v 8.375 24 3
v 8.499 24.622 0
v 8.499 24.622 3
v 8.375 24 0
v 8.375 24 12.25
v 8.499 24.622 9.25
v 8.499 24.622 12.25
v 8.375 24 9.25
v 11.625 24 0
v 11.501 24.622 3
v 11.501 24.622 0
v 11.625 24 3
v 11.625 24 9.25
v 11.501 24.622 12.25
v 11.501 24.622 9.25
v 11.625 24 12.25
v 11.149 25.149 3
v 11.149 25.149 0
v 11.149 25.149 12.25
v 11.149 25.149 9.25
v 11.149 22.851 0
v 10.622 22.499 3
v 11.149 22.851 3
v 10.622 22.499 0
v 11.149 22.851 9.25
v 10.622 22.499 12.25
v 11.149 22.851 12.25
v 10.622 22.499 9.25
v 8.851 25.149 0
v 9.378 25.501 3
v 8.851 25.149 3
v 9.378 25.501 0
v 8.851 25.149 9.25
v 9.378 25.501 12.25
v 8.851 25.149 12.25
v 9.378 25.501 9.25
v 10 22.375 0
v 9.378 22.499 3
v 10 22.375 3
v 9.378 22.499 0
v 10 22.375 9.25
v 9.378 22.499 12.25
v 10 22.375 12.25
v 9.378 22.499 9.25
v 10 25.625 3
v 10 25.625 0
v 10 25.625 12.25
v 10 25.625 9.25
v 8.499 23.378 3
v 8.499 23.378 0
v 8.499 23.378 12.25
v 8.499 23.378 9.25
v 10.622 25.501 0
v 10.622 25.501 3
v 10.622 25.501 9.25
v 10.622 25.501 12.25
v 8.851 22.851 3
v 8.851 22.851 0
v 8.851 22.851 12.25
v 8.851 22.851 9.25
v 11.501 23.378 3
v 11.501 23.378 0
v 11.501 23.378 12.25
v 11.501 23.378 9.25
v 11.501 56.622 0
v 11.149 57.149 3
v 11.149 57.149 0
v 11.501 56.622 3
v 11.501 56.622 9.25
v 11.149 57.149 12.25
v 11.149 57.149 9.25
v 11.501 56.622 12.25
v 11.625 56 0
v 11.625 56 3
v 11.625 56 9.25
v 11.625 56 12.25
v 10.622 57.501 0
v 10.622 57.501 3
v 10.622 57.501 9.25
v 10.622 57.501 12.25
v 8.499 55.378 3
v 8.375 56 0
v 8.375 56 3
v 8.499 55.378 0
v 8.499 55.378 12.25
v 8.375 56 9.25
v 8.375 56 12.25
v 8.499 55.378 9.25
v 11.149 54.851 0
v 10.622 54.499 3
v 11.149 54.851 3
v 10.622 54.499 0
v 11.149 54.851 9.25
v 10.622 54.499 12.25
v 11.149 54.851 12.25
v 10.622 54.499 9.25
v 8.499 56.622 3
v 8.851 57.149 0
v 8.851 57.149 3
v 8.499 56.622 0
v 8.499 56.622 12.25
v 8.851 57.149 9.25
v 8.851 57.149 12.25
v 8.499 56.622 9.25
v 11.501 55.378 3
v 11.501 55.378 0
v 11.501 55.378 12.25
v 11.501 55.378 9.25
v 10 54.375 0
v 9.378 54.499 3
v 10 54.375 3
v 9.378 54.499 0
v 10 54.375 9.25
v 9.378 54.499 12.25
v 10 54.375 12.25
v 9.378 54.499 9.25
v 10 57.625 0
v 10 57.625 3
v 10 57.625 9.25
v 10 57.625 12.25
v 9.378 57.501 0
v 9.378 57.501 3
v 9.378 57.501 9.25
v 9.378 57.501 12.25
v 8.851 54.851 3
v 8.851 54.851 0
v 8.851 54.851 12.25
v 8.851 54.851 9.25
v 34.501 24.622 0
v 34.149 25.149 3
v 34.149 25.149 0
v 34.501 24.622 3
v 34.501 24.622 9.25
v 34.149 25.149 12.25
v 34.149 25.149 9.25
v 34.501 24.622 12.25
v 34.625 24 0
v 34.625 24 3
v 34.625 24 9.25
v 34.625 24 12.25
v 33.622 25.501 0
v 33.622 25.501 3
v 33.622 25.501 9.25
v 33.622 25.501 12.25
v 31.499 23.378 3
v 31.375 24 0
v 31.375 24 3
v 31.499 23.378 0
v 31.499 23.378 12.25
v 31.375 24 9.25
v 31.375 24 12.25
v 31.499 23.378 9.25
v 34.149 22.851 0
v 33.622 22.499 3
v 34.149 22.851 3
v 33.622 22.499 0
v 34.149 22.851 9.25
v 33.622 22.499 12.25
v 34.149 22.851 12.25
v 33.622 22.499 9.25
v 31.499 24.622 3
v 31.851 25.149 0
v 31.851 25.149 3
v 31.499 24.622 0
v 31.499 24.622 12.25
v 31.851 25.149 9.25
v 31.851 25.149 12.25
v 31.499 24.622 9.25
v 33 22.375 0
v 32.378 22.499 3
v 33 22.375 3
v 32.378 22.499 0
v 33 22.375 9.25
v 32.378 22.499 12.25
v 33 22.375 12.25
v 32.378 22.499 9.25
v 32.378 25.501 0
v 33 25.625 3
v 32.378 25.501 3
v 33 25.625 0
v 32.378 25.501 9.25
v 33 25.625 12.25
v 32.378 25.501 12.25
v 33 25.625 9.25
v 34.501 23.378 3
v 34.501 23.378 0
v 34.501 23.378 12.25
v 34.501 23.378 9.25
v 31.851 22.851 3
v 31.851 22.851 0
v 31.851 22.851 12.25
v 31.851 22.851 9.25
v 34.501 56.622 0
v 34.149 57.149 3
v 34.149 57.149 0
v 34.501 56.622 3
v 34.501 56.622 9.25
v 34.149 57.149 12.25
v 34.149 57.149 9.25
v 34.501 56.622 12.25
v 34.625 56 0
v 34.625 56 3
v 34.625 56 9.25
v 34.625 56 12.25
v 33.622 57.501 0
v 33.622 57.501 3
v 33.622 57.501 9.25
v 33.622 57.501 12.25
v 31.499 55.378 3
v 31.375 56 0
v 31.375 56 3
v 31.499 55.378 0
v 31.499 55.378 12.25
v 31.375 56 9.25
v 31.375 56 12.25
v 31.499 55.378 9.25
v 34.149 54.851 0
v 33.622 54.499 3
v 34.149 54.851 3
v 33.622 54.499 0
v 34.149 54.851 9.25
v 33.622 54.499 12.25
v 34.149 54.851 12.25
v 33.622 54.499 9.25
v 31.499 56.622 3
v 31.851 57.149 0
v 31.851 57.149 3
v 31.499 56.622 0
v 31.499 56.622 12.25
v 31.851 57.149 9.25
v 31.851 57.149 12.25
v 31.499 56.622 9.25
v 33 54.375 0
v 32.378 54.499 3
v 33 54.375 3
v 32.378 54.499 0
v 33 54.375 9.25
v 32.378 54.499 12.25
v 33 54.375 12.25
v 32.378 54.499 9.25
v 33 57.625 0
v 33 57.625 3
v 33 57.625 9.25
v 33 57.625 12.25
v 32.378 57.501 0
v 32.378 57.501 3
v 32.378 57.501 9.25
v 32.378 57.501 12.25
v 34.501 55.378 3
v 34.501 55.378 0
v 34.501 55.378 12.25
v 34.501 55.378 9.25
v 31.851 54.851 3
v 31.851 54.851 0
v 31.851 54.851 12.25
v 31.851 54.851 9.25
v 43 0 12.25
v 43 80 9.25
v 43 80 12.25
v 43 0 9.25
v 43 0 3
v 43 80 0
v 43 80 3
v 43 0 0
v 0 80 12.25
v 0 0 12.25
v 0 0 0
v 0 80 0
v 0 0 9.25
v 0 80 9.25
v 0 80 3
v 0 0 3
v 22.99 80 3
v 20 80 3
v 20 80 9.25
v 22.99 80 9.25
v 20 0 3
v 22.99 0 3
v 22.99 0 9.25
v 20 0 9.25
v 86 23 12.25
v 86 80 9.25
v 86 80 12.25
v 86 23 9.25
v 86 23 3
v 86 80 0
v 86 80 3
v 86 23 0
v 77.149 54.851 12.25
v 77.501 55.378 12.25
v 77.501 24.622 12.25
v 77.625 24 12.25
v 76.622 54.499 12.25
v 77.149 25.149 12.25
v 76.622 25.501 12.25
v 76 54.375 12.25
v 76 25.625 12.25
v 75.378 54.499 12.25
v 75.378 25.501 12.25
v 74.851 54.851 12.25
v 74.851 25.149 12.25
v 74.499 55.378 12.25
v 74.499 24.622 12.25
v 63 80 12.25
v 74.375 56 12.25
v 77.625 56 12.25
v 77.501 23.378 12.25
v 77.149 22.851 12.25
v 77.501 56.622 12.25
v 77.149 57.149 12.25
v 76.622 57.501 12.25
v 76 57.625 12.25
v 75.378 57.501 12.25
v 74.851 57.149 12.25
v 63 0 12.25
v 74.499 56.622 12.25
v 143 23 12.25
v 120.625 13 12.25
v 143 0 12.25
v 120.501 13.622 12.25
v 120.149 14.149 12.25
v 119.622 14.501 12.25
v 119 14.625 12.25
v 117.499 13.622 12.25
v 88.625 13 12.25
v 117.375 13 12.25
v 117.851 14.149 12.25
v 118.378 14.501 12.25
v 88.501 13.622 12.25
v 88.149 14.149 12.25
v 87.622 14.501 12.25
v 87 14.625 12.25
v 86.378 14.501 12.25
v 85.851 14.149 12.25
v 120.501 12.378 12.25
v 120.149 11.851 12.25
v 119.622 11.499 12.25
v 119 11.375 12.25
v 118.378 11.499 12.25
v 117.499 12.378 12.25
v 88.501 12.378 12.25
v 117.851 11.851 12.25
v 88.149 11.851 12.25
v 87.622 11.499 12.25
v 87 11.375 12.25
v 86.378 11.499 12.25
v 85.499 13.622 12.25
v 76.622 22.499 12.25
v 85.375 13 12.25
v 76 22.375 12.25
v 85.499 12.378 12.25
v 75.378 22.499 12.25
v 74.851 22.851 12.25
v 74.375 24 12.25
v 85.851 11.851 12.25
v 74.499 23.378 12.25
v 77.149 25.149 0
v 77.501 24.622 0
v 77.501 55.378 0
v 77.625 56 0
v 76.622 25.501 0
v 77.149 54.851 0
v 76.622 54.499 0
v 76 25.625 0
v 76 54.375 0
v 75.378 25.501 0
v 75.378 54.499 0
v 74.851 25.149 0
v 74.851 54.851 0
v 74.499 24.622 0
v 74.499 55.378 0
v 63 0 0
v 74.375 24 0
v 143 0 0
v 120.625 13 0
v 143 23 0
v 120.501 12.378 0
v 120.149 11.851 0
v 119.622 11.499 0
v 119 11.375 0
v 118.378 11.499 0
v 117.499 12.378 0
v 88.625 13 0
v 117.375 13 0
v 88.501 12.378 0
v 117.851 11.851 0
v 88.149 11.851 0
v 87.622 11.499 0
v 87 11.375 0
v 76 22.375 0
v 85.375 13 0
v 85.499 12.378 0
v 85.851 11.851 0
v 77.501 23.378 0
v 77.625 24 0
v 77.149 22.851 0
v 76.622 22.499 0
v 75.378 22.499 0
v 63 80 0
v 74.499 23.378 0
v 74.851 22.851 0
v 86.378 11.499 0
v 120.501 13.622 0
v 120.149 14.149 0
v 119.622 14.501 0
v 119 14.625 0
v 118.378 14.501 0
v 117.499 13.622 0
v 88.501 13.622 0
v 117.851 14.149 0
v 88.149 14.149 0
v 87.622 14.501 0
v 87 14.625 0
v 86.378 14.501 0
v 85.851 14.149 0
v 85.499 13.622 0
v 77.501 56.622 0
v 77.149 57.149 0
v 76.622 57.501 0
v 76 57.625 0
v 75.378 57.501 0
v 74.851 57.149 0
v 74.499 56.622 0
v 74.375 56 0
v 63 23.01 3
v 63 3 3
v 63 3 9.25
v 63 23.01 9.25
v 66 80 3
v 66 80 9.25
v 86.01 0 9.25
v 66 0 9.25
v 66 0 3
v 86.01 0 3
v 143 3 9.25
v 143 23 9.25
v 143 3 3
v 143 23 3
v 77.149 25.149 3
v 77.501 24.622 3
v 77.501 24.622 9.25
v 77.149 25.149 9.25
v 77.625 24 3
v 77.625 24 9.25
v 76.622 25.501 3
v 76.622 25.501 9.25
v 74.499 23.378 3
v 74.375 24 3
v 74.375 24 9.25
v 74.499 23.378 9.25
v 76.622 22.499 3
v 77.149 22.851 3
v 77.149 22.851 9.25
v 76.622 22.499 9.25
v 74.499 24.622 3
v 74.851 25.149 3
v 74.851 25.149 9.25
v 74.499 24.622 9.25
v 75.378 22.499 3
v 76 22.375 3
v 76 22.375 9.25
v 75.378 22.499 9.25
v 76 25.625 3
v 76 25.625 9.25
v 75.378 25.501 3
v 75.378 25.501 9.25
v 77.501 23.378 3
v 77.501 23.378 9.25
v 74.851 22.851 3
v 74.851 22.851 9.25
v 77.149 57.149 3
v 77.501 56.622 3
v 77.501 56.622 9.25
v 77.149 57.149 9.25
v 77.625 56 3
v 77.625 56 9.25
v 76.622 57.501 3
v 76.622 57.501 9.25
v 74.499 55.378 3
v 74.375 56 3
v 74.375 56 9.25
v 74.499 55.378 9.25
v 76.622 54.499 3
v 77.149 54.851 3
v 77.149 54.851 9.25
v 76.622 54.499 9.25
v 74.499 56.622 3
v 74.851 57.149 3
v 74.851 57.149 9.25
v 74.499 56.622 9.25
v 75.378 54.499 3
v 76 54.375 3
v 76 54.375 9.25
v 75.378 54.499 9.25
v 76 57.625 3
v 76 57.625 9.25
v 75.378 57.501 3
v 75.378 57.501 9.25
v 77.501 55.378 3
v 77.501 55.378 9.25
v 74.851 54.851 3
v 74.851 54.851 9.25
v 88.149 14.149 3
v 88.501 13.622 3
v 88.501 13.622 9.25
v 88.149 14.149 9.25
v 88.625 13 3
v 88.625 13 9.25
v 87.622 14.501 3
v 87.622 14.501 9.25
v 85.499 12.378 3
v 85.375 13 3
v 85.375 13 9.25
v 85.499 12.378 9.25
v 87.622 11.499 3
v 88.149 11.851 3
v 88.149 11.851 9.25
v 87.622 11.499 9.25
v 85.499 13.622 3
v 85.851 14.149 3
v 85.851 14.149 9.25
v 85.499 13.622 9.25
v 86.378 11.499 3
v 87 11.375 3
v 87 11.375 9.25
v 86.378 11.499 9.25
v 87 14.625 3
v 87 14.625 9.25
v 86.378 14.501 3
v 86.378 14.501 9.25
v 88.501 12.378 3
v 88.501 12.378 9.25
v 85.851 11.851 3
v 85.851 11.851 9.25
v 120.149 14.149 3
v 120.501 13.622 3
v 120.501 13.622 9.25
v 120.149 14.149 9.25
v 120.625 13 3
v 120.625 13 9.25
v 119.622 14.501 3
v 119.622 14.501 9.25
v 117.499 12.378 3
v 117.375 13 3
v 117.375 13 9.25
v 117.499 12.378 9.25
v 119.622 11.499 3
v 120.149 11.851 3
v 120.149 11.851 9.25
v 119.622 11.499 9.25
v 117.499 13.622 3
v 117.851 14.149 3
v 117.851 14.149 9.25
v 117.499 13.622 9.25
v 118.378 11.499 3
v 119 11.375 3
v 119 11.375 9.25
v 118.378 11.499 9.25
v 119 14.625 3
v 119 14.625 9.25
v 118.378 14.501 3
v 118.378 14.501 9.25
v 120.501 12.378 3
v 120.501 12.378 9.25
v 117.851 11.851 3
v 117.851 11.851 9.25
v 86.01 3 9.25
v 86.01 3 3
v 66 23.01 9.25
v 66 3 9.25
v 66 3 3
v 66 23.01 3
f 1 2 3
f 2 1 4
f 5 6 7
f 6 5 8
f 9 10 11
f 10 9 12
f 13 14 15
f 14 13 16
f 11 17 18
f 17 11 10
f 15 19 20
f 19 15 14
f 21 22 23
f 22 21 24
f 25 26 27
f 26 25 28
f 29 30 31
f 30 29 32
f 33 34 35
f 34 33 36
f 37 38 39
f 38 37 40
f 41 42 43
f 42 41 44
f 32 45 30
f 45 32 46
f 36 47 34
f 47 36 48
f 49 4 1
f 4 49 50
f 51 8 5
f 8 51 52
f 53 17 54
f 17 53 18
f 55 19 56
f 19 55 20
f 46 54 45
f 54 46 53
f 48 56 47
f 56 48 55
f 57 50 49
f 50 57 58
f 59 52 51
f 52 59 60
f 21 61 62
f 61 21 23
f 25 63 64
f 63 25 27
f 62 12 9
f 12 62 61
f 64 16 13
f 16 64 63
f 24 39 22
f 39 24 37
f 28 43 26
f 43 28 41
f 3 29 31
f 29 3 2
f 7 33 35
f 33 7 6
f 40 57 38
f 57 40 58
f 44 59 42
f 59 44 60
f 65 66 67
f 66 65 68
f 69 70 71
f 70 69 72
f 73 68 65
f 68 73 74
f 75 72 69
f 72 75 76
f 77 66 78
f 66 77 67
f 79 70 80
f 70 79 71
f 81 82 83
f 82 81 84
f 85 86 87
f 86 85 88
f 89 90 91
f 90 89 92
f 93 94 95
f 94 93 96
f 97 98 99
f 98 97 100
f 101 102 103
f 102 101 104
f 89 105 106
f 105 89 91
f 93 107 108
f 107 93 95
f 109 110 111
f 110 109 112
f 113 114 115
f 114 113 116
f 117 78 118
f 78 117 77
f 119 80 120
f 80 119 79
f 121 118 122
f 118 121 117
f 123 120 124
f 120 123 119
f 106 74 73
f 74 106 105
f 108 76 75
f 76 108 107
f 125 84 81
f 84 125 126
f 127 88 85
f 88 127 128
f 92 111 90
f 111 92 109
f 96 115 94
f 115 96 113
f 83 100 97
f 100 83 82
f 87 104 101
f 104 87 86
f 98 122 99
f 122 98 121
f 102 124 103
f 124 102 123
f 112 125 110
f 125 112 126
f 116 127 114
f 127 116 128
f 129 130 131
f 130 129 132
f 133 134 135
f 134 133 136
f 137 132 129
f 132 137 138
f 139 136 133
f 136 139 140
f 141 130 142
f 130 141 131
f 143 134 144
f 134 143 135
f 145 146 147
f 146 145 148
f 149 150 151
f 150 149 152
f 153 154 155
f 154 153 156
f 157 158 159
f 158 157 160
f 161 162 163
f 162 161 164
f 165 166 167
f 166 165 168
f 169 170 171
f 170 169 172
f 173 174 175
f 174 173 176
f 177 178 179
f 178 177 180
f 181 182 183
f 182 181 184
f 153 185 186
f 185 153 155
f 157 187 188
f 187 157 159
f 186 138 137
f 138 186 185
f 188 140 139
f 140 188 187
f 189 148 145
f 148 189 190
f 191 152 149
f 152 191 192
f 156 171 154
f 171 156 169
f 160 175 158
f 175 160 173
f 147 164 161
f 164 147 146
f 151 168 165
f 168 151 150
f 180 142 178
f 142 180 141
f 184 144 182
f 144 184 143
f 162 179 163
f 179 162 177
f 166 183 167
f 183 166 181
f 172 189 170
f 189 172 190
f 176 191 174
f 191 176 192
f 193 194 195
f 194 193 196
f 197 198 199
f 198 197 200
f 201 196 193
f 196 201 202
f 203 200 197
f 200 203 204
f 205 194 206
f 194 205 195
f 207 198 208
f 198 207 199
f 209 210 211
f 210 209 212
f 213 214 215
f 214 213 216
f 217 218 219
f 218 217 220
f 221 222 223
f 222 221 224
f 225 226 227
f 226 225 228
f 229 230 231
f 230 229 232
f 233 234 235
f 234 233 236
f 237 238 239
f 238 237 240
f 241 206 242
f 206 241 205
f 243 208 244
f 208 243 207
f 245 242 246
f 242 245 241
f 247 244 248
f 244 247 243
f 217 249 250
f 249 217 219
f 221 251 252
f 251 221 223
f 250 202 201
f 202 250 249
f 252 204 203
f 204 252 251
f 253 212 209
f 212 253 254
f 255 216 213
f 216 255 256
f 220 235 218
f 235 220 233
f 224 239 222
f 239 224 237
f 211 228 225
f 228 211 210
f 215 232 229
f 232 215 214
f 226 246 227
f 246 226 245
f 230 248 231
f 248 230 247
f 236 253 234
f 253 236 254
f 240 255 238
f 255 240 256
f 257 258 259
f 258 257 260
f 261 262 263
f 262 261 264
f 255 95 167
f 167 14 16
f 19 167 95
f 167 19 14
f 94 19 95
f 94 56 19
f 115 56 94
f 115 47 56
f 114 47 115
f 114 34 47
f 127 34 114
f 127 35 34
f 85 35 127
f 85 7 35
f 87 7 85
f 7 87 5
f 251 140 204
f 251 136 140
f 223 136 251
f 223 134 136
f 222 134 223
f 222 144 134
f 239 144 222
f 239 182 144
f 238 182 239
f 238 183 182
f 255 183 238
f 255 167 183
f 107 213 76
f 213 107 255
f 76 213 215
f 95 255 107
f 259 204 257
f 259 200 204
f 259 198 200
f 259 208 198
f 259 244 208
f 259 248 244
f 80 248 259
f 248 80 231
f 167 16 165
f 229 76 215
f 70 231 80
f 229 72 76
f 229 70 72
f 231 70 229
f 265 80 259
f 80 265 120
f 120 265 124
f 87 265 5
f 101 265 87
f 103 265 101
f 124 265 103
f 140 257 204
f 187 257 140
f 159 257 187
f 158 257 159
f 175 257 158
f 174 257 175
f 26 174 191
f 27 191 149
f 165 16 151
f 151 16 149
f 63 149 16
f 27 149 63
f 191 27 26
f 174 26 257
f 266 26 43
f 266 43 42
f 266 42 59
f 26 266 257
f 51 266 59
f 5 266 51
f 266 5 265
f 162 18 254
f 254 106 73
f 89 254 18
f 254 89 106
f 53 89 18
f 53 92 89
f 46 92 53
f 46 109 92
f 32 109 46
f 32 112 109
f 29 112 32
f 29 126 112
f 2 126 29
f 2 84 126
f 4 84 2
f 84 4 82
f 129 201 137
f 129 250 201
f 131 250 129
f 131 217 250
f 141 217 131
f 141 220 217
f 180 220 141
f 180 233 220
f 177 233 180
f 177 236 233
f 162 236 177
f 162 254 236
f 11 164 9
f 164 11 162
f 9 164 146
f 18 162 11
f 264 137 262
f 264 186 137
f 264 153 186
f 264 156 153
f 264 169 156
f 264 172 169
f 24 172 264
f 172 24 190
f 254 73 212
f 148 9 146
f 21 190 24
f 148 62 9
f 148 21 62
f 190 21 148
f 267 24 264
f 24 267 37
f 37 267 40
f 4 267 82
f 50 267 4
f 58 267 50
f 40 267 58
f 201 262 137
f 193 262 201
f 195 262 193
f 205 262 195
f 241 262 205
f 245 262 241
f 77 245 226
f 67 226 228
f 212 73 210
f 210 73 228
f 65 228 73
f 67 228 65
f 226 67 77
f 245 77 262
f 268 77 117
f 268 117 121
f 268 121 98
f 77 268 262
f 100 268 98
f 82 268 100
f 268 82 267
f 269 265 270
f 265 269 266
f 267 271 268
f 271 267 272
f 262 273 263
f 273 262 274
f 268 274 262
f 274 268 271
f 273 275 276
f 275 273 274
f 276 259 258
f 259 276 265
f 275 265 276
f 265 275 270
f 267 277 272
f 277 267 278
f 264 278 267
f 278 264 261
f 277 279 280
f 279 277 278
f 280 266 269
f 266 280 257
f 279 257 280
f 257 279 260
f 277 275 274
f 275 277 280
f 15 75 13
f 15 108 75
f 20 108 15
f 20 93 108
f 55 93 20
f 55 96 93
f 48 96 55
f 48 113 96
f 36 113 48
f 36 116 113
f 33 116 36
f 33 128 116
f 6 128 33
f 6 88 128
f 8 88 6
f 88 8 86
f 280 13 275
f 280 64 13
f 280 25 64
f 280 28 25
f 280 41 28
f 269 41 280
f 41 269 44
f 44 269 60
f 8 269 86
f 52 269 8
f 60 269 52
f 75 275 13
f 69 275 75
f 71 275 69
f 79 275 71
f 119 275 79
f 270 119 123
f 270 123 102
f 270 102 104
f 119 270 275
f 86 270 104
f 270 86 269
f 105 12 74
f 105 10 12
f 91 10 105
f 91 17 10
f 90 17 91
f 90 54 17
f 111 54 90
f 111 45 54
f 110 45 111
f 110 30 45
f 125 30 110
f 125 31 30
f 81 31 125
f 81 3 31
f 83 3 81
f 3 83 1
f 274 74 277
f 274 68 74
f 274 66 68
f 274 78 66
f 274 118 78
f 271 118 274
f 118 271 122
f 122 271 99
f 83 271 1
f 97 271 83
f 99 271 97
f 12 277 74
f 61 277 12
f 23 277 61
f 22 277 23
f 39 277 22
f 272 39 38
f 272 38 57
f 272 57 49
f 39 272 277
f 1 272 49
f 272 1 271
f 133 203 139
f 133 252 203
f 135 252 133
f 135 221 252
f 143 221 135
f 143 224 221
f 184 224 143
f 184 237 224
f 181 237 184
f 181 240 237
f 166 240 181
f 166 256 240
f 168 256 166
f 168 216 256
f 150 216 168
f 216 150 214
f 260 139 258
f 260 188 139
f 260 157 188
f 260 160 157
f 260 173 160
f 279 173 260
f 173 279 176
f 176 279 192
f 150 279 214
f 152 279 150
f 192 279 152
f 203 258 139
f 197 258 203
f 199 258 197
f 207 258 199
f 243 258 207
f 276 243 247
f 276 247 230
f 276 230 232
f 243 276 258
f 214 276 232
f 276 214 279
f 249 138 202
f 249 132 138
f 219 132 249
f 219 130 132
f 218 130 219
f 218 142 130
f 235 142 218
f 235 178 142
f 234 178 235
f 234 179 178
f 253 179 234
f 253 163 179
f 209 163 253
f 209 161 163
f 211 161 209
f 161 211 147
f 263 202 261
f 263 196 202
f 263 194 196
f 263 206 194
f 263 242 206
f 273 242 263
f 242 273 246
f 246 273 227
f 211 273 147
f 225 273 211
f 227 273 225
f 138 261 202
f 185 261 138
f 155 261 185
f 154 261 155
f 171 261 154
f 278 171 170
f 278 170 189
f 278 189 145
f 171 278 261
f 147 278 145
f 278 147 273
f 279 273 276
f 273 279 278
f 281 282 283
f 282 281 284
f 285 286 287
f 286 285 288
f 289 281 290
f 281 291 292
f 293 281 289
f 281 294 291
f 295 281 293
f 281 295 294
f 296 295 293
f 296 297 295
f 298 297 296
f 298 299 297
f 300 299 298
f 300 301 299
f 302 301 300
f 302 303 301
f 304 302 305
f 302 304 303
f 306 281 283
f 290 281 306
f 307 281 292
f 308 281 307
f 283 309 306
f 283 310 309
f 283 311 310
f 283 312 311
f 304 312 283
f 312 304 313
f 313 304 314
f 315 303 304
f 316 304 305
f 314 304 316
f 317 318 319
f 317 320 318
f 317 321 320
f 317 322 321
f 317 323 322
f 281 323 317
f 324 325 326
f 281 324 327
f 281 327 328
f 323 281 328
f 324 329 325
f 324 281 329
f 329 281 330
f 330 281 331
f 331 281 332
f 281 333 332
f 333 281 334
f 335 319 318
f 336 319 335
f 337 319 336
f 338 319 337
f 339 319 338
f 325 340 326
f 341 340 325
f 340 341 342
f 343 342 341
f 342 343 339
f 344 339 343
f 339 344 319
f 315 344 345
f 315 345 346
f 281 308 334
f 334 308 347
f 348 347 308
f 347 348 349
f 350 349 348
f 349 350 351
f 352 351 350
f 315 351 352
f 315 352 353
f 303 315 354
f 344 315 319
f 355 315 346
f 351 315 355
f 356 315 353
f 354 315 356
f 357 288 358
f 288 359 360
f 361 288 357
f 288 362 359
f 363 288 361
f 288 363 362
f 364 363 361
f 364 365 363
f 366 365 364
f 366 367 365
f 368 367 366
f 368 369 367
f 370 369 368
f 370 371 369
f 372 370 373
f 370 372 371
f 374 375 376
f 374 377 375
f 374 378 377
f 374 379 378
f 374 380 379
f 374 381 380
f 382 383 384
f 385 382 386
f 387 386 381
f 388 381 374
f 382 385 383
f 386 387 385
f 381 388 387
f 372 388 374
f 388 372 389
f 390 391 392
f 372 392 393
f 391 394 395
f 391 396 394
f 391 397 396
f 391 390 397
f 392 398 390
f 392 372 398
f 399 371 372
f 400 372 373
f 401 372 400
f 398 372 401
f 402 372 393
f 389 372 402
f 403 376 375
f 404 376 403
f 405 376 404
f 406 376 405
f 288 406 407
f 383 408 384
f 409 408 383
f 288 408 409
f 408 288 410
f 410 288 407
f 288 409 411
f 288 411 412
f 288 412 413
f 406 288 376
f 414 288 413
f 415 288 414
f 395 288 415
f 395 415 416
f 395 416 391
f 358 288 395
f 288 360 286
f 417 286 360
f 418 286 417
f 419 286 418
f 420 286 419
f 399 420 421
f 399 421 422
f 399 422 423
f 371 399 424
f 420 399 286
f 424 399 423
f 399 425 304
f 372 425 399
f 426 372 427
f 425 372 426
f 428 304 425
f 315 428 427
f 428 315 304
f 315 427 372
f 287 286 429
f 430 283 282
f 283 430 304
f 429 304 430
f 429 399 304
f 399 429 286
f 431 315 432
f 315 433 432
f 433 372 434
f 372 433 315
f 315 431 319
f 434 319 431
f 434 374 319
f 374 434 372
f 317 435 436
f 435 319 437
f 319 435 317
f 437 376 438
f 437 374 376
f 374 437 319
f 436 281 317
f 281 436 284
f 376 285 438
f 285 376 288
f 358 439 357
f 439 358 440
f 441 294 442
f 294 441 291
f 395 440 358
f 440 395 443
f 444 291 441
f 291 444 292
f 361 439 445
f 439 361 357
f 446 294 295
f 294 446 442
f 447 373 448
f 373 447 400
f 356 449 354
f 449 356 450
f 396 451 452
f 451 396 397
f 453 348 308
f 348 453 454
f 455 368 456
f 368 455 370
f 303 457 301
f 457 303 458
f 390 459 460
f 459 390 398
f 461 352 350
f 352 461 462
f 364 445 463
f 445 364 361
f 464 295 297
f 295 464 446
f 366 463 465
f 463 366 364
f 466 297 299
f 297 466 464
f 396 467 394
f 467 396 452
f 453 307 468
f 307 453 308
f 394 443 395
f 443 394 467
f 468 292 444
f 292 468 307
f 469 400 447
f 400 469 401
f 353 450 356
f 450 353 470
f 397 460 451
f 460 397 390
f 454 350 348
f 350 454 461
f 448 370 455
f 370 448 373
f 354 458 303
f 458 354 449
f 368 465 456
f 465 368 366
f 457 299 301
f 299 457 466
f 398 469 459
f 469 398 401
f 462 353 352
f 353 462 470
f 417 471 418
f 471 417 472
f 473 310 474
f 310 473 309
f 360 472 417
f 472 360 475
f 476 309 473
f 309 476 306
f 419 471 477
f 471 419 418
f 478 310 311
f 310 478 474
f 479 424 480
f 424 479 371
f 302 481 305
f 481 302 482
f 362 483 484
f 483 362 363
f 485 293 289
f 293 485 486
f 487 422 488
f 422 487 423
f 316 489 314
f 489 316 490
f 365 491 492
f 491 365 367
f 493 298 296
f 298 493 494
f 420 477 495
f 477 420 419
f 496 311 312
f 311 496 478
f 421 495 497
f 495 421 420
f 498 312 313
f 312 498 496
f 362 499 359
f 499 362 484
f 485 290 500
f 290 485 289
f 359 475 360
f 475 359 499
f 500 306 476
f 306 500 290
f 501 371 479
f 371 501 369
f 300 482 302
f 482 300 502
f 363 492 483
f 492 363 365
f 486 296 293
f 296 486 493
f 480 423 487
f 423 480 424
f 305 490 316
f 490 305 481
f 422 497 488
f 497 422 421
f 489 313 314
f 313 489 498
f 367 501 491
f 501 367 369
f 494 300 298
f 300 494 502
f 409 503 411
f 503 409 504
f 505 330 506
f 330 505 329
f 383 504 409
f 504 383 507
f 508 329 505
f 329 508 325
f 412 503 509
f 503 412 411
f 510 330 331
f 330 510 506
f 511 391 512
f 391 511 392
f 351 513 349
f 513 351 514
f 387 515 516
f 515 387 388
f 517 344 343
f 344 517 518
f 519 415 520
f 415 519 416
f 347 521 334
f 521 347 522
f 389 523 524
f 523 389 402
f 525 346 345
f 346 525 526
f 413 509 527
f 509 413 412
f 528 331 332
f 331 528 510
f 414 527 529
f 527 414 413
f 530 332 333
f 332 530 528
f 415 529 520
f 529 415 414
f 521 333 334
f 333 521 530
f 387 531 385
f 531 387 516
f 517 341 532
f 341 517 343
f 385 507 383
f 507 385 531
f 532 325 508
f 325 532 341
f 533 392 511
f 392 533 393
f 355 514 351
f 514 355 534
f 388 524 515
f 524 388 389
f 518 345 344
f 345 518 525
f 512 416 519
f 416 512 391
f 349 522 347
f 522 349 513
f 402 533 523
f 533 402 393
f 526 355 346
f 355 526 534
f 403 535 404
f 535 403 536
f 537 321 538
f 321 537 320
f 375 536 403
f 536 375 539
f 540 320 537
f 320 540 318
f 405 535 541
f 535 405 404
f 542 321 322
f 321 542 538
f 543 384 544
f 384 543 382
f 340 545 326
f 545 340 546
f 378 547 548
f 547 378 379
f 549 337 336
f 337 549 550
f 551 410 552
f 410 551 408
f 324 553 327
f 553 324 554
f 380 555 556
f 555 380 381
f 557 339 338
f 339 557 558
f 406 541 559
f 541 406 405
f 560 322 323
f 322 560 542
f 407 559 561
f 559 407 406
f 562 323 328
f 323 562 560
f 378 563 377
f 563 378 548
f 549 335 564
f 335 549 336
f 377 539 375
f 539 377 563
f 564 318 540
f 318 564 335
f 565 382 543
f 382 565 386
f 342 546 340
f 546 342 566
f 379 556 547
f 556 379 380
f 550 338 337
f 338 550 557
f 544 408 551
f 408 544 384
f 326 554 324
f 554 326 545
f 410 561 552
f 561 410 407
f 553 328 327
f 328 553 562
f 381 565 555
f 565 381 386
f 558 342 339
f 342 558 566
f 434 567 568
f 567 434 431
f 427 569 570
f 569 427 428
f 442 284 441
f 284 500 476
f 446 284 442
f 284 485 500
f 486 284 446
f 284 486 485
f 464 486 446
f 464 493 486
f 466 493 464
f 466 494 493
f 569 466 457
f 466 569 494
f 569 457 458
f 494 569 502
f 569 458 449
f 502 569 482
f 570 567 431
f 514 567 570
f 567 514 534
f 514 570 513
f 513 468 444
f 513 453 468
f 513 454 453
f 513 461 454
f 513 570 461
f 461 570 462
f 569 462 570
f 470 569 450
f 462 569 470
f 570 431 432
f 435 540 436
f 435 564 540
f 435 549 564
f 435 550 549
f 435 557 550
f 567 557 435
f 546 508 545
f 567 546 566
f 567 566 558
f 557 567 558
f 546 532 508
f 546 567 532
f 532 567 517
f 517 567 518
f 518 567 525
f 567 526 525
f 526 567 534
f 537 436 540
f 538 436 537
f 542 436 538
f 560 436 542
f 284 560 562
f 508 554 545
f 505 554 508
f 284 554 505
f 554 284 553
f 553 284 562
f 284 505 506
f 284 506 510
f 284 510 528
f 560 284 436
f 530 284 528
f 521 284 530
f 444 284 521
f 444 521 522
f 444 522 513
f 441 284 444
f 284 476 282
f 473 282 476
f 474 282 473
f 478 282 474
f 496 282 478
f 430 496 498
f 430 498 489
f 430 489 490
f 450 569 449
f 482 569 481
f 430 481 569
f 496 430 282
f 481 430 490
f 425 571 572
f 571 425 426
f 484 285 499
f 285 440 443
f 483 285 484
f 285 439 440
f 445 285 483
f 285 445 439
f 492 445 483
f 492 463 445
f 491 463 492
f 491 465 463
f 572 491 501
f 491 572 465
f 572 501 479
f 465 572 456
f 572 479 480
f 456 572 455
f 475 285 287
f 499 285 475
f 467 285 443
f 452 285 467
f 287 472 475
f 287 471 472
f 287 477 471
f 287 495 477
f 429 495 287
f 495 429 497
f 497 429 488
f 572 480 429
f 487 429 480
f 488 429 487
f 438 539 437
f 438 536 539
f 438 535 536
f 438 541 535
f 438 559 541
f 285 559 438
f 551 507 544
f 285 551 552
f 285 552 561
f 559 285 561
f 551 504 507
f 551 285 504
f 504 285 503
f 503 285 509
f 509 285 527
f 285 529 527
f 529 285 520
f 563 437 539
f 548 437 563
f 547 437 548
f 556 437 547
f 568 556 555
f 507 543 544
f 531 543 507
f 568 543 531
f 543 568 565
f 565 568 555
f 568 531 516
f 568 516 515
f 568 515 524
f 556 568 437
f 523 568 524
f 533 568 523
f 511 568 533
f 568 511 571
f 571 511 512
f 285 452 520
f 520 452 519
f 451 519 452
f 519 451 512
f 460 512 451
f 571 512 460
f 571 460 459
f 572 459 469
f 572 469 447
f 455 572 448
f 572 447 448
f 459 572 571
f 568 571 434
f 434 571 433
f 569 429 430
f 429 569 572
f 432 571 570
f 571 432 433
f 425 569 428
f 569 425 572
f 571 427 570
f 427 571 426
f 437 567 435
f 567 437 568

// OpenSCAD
// =============================================================
// drawer_connectors.scad
// Parametric 3D-print connectors for split IKEA-style drawer boards.
//
// Two joint types:
//   flat_splice(...)    join two boards end-to-end, same plane
//   corner_joint(...)   join two boards at 90°
//
// Design strategy:
//   • Each board end slides into a snug U-channel (slot) and is locked
//     with M3 bolts that pass through the connector and the board.
//   • Walls are 3 mm — minimum FDM structural thickness.
//   • No supports needed: print flat on the build plate.
//   • Glue the joint for permanent assemblies; bolts alone for removable ones.
//
// Shared parameters
//   board_t   board thickness (mm)               [default 6]
//   board_w   board width = drawer height (mm)   [default 80]
//   grip      how deep each board inserts (mm)   [default 20]
//   wall      connector wall thickness (mm)      [default 3]
//   bolt_d    through-bolt diameter (0 = none)   [default 3  → M3]
//   tol       board-into-slot clearance          [default 0.25]
// =============================================================

$fa = 2; $fs = 0.4;
_tol = 0.25;   // FDM fit tolerance (add to slot size, not board size)


// =============================================================
// TYPE 1 — FLAT SPLICE
// Join two boards end-to-end in the same plane.
//
// How it works
// ─────────────
//   The connector is a hollow H-profile:
//   • Pocket A — board A slides in from the left  (−X face open)
//   • Pocket B — board B slides in from the right (+X face open)
//   • Center rib — 'wall' thick; separates the two pockets
//   • Top & bottom walls — 'wall' thick
//   Two M3 bolts per pocket pass through top→board→bottom to lock.
//
// Cross-section view (boards going left-right, Z = up):
//
//   ┌────────────────────────┐  ← top wall (wall mm)
//   │←── board A  │  board B─→│  ← slot (board_t + tol)
//   └────────────────────────┘  ← bottom wall (wall mm)
//   |←── grip ───|rib|─ grip──|
//
// Print orientation: flat on build plate (Z = up). No supports.
// =============================================================

module flat_splice(
    board_t = 6,
    board_w = 80,
    grip    = 20,
    wall    = 3,
    bolt_d  = 3
) {
    slot_h    = board_t + _tol;
    outer_h   = slot_h + 2 * wall;
    outer_len = 2 * grip + wall;   // pocket A + center rib + pocket B

    difference() {
        // ── solid outer block ─────────────────────────────────
        cube([outer_len, board_w, outer_h]);

        // ── pocket A — open on −X face (board enters from left) ─
        translate([-0.01, -0.01, wall])
            cube([grip + 0.01, board_w + 0.02, slot_h]);

        // ── pocket B — open on +X face (board enters from right) ─
        translate([grip + wall - 0.01, -0.01, wall])
            cube([grip + 0.02, board_w + 0.02, slot_h]);

        // ── bolt holes — through Z, 2 per pocket ──────────────
        // Placed at 30 % and 70 % of board_w so they clear edges.
        if (bolt_d > 0) {
            for (bx = [grip / 2,            // centre of pocket A
                       grip + wall + grip / 2])  // centre of pocket B
            for (by = [board_w * 0.3, board_w * 0.7])
                translate([bx, by, -0.01])
                    cylinder(d = bolt_d + _tol, h = outer_h + 0.02, $fn = 16);
        }

        // ── hollow center rib interior (material saving) ───────
        // Only if the rib is wider than 4 mm; leaves a 1 mm shell.
        if (wall > 4)
            translate([grip + 1, 1, 1])
                cube([wall - 2, board_w - 2, outer_h - 2]);
    }
}


// =============================================================
// TYPE 2 — CORNER JOINT
// Join two boards at 90° (e.g., drawer side ↔ drawer front).
//
// How it works
// ─────────────
//   The connector is an L-shaped body, each arm being a U-channel:
//   • Arm A — board A slides in from the +X face
//   • Arm B — board B slides in from the +Y face
//   • The arms overlap in a solid corner block (grip+wall square).
//     Below and above the slot zone this block is fully solid;
//     within the slot zone four 3 mm corner pillars carry the load.
//
// Top-view schematic (looking down):
//
//            board A →
//   ┌──────────────────┐
//   │   arm A (slot)   │    ← board A enters from +X
//   │ ─────────────── │
//   ├──────────────┐   │
//   │   arm B      │   │    ← board B enters from +Y (going up in this view)
//   │   (slot)     │   │
//   └──────────────┘   │
//
// Print orientation: flat on build plate (Z = up). No supports.
// =============================================================

module corner_joint(
    board_t = 6,
    board_w = 80,
    grip    = 20,
    wall    = 3,
    bolt_d  = 3
) {
    slot_h  = board_t + _tol;
    outer_h = slot_h + 2 * wall;
    ow      = grip + wall;    // arm width = insertion depth + back wall

    difference() {
        union() {
            // ── arm A — board_w in Y, ow deep in X ──────────────
            cube([ow, board_w, outer_h]);

            // ── arm B — board_w in X, ow deep in Y ──────────────
            cube([board_w, ow, outer_h]);
            // The two arms overlap in the corner block [0,ow]×[0,ow],
            // which union() handles naturally — no double-geometry issue.
        }

        // ── slot A — board enters from +X face ────────────────
        // Slot runs from x=wall inward to x=ow (open at x=ow).
        // Full board_w in Y, slot_h in Z, centred at wall offset from base.
        translate([wall, -0.01, wall])
            cube([grip + 0.01, board_w + 0.02, slot_h]);

        // ── slot B — board enters from +Y face ────────────────
        translate([-0.01, wall, wall])
            cube([board_w + 0.02, grip + 0.01, slot_h]);

        // ── bolt holes for arm A — 2 bolts through Z ──────────
        if (bolt_d > 0) {
            for (by = [board_w * 0.3, board_w * 0.7])
                translate([wall + grip / 2, by, -0.01])
                    cylinder(d = bolt_d + _tol, h = outer_h + 0.02, $fn = 16);

            // ── bolt holes for arm B ───────────────────────────
            for (bx = [board_w * 0.3, board_w * 0.7])
                translate([bx, wall + grip / 2, -0.01])
                    cylinder(d = bolt_d + _tol, h = outer_h + 0.02, $fn = 16);
        }
    }
}


// =============================================================
// DEMO — renders both connectors side by side for preview.
//
// Default values match a 6 mm thick board, 80 mm tall (drawer height),
// with M3 bolts. Adjust to your actual board dimensions.
//
// To print:
//   1. Render (F6) and export each connector to STL separately.
//   2. Print flat (the wide face on the build plate). No supports.
//   3. For the flat splice: bolt through top + bottom with M3 × 15 mm.
//   4. For the corner joint: bolt through top + bottom with M3 × 15 mm.
//   5. Optional: apply CA glue in the slot for a permanent bond.
//
// Material note: PETG > PLA for a drawer (humidity resistance, flex).
// =============================================================

_board_t = 6;
_board_w = 80;
_grip    = 20;
_wall    = 3;
_bolt_d  = 3;

color("SteelBlue", 0.9)
flat_splice(
    board_t = _board_t,
    board_w = _board_w,
    grip    = _grip,
    wall    = _wall,
    bolt_d  = _bolt_d
);

// Corner joint offset to the right for side-by-side view
translate([2 * _grip + _wall + 20, 0, 0])
color("Tomato", 0.9)
corner_joint(
    board_t = _board_t,
    board_w = _board_w,
    grip    = _grip,
    wall    = _wall,
    bolt_d  = _bolt_d
);
